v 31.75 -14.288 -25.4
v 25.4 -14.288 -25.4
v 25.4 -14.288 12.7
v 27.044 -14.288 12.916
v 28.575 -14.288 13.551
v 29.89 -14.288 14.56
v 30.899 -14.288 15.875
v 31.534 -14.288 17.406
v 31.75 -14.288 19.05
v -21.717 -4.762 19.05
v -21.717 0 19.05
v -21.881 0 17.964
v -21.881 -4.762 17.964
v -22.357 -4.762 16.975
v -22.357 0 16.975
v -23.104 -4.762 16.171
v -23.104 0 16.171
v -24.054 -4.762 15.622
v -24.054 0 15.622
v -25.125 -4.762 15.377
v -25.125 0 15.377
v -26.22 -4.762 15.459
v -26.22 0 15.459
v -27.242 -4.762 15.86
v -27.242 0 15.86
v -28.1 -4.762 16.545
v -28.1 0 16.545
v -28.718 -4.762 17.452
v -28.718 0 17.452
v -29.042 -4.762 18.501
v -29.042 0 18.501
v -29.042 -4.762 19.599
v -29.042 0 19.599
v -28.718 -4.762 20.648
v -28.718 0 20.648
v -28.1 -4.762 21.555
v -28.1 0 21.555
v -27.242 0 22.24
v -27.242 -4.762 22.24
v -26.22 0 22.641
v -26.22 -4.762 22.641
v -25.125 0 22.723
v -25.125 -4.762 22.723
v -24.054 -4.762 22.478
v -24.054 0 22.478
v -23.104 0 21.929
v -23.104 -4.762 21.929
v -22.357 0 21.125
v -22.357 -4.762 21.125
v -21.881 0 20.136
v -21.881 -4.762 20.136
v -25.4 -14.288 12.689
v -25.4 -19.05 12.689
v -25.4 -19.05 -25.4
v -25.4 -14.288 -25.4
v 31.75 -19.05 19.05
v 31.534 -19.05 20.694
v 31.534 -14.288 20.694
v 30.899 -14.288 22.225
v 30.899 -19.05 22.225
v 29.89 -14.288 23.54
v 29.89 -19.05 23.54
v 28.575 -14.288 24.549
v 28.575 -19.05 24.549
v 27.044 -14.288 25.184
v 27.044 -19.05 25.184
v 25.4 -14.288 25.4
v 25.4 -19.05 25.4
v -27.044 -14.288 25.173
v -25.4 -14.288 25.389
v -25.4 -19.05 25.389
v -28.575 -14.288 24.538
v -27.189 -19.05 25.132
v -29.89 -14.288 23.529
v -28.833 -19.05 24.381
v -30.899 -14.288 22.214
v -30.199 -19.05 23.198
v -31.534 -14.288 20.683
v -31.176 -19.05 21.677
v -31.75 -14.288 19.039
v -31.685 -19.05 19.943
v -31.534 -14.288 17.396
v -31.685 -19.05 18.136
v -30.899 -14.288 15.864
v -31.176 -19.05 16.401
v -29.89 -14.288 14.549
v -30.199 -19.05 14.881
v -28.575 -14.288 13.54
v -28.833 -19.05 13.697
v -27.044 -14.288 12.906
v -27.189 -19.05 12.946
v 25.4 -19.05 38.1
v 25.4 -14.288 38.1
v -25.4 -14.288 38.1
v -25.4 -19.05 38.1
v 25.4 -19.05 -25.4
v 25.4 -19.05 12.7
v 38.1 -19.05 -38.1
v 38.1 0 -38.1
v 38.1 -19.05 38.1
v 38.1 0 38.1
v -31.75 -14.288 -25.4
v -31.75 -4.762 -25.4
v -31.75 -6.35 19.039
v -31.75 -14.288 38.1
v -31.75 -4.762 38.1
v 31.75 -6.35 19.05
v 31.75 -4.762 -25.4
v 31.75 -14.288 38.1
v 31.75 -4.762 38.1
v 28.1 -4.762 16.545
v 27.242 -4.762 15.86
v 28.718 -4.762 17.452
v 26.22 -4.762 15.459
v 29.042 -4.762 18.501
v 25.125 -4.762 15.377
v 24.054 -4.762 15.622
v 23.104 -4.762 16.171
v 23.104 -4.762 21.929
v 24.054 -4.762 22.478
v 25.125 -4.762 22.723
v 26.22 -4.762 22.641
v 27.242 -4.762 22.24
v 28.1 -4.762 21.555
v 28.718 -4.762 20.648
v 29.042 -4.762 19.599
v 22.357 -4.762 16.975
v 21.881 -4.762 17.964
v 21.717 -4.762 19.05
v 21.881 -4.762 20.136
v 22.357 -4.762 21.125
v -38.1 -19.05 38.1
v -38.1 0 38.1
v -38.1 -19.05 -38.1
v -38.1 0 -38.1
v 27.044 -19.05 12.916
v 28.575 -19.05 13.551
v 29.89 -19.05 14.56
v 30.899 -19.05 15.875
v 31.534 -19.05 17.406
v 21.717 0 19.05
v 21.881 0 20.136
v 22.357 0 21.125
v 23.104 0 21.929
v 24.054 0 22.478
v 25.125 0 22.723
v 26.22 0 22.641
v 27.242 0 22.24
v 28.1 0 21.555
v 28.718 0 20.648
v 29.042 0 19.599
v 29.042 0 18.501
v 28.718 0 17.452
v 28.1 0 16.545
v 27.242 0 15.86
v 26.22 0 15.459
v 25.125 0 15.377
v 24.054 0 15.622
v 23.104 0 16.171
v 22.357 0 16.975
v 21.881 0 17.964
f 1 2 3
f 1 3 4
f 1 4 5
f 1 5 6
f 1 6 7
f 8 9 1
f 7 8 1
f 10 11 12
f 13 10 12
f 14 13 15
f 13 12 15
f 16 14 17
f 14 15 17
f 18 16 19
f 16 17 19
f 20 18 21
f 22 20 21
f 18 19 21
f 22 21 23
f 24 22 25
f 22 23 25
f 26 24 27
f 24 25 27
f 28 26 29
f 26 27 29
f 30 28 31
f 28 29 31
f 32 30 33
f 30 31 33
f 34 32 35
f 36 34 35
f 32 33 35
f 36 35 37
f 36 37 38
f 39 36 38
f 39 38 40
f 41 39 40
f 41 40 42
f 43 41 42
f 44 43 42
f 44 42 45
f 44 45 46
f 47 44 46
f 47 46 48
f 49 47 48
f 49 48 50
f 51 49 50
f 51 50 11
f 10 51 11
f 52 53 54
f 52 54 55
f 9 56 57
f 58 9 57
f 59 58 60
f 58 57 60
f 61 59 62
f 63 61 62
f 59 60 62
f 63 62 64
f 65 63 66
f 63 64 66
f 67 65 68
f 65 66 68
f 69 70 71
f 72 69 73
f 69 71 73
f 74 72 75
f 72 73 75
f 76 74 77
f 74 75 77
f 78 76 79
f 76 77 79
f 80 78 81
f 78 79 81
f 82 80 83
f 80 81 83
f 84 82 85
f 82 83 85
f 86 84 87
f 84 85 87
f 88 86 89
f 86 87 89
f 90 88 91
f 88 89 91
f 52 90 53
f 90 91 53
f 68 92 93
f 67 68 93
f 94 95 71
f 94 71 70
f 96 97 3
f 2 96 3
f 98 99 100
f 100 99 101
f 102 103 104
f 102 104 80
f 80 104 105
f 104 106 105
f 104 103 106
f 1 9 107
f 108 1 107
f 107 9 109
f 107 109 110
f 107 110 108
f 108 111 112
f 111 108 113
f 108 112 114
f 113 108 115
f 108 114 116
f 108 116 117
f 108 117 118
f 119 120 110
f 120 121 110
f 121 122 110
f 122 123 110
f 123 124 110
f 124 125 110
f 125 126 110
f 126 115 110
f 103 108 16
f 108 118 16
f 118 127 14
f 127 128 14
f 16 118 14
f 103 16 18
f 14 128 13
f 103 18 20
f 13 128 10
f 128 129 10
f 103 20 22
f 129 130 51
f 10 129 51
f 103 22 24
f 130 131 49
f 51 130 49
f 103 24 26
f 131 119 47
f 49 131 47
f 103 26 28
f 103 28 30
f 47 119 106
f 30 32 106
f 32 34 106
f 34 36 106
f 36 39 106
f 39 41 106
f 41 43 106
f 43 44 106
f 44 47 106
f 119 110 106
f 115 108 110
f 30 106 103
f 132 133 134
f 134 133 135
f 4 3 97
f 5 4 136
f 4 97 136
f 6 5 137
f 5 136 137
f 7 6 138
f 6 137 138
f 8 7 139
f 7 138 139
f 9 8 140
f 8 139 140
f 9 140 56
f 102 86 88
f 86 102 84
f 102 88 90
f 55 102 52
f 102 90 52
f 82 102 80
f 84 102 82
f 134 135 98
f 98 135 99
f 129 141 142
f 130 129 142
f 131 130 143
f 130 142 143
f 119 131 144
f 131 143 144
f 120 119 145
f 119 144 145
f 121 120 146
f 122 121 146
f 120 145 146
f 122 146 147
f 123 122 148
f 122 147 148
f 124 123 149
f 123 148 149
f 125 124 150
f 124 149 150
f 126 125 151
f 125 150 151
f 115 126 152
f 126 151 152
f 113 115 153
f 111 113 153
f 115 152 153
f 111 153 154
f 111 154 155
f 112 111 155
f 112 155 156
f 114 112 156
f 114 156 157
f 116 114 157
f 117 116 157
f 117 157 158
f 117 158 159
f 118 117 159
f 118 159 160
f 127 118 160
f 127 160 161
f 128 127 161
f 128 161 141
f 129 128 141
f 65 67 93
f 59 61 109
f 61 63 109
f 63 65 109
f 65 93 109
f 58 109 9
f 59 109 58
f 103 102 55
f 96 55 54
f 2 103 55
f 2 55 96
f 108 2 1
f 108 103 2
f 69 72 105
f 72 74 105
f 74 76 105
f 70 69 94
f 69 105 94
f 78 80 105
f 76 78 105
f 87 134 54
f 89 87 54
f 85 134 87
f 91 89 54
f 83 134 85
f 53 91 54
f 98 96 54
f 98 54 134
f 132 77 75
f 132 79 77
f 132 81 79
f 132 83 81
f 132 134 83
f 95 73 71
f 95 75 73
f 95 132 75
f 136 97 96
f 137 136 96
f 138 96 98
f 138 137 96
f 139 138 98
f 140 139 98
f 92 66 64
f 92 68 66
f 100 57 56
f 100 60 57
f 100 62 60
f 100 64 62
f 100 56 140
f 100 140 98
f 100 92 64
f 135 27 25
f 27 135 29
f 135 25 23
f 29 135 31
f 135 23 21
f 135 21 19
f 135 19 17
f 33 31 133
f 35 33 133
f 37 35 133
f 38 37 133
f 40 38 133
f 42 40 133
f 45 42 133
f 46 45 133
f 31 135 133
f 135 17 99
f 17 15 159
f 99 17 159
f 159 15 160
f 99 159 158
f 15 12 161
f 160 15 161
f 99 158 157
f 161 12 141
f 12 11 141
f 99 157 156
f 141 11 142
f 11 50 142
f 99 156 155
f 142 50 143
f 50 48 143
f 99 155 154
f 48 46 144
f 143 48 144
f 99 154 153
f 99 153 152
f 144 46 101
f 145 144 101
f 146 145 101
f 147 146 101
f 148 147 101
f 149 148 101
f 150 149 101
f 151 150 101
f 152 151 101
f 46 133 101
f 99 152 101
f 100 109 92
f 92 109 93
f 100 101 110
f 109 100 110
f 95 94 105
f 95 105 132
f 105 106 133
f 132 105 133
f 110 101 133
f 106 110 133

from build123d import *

# Parameters (mm, degrees)
F1_DEPTH = 19.05
F2_W     = 6.35
F2_H     = 4.7625
F2_W_2   = 50.8
F3_DEPTH = 63.5
F5_DEPTH = 10.16
F8_DEPTH = 12.7


with BuildPart() as f1:
    # F0 (on Front) → F1 (new body)
    with BuildSketch(Plane.XZ):
        Polygon((0, -38.1), (0, 0), (0, 38.1), (-38.1, 38.1), (-38.1, 0), (-38.1, -38.1), align=None)
        Polygon((0, 38.1), (0, 0), (0, -38.1), (38.1, -38.1), (38.1, 0), (38.1, 38.1), align=None)
    extrude(amount=F1_DEPTH)

    # F2 (on face) → F3 (cut)
    with BuildSketch(Plane.XY.offset(38.1)):
        Polygon((-25.4, -14.2875), (25.4, -14.2875), (25.4, -9.525), (25.4, -4.7625), (-25.4, -4.7625), (-25.4, -9.525), align=None)
        with Locations((28.575, -11.90625)):
            Rectangle(F2_W, F2_H)
        with Locations((28.575, -7.14375)):
            Rectangle(F2_W, F2_H)
        with Locations((-28.575, -11.90625)):
            Rectangle(F2_W, F2_H)
        with Locations((-28.575, -7.14375)):
            Rectangle(F2_W, F2_H)
        with Locations((0, -16.66875)):
            Rectangle(F2_W_2, F2_H)
    extrude(amount=-F3_DEPTH, mode=Mode.SUBTRACT)

    # F4 (on face) → F5 (cut)
    with BuildSketch(Plane(origin=(0, 0, 0), x_dir=(-1, 0, 0), z_dir=(0, 1, 0))):
        with BuildLine():
            ThreePointArc((-29.083, 19.05), (-25.4, 15.367), (-21.717, 19.05))
            Line((-21.717, 19.05), (-25.4, 19.05))
            Line((-25.4, 19.05), (-29.083, 19.05))
        make_face()
        with BuildLine():
            Line((-25.4, 19.05), (-21.717, 19.05))
            ThreePointArc((-21.717, 19.05), (-25.4, 22.733), (-29.083, 19.05))
            Line((-29.083, 19.05), (-25.4, 19.05))
        make_face()
        with BuildLine():
            ThreePointArc((29.083, 19.05), (25.4, 22.733), (21.717, 19.05))
            Line((21.717, 19.05), (25.4, 19.05))
            Line((25.4, 19.05), (29.083, 19.05))
        make_face()
        with BuildLine():
            Line((25.4, 19.05), (21.717, 19.05))
            ThreePointArc((21.717, 19.05), (25.4, 15.367), (29.083, 19.05))
            Line((29.083, 19.05), (25.4, 19.05))
        make_face()
    extrude(amount=-F5_DEPTH, mode=Mode.SUBTRACT)

    # F7 (on face) → F8 (cut)
    with BuildSketch(Plane.XZ.offset(19.05)):
        with BuildLine():
            ThreePointArc((-25.4, 25.3892062068), (-29.8901280605, 14.5490781463), (-19.05, 19.0392062068))
            ThreePointArc((-19.05, 19.0392062068), (-20.9098719395, 23.5293342673), (-25.4, 25.3892062068))
        make_face()
        with BuildLine():
            ThreePointArc((25.4, 25.4), (20.9098719395, 14.5598719395), (31.75, 19.05))
            ThreePointArc((31.75, 19.05), (29.8901280605, 23.5401280605), (25.4, 25.4))
        make_face()
    extrude(amount=-F8_DEPTH, mode=Mode.SUBTRACT)


solid = f1.part
